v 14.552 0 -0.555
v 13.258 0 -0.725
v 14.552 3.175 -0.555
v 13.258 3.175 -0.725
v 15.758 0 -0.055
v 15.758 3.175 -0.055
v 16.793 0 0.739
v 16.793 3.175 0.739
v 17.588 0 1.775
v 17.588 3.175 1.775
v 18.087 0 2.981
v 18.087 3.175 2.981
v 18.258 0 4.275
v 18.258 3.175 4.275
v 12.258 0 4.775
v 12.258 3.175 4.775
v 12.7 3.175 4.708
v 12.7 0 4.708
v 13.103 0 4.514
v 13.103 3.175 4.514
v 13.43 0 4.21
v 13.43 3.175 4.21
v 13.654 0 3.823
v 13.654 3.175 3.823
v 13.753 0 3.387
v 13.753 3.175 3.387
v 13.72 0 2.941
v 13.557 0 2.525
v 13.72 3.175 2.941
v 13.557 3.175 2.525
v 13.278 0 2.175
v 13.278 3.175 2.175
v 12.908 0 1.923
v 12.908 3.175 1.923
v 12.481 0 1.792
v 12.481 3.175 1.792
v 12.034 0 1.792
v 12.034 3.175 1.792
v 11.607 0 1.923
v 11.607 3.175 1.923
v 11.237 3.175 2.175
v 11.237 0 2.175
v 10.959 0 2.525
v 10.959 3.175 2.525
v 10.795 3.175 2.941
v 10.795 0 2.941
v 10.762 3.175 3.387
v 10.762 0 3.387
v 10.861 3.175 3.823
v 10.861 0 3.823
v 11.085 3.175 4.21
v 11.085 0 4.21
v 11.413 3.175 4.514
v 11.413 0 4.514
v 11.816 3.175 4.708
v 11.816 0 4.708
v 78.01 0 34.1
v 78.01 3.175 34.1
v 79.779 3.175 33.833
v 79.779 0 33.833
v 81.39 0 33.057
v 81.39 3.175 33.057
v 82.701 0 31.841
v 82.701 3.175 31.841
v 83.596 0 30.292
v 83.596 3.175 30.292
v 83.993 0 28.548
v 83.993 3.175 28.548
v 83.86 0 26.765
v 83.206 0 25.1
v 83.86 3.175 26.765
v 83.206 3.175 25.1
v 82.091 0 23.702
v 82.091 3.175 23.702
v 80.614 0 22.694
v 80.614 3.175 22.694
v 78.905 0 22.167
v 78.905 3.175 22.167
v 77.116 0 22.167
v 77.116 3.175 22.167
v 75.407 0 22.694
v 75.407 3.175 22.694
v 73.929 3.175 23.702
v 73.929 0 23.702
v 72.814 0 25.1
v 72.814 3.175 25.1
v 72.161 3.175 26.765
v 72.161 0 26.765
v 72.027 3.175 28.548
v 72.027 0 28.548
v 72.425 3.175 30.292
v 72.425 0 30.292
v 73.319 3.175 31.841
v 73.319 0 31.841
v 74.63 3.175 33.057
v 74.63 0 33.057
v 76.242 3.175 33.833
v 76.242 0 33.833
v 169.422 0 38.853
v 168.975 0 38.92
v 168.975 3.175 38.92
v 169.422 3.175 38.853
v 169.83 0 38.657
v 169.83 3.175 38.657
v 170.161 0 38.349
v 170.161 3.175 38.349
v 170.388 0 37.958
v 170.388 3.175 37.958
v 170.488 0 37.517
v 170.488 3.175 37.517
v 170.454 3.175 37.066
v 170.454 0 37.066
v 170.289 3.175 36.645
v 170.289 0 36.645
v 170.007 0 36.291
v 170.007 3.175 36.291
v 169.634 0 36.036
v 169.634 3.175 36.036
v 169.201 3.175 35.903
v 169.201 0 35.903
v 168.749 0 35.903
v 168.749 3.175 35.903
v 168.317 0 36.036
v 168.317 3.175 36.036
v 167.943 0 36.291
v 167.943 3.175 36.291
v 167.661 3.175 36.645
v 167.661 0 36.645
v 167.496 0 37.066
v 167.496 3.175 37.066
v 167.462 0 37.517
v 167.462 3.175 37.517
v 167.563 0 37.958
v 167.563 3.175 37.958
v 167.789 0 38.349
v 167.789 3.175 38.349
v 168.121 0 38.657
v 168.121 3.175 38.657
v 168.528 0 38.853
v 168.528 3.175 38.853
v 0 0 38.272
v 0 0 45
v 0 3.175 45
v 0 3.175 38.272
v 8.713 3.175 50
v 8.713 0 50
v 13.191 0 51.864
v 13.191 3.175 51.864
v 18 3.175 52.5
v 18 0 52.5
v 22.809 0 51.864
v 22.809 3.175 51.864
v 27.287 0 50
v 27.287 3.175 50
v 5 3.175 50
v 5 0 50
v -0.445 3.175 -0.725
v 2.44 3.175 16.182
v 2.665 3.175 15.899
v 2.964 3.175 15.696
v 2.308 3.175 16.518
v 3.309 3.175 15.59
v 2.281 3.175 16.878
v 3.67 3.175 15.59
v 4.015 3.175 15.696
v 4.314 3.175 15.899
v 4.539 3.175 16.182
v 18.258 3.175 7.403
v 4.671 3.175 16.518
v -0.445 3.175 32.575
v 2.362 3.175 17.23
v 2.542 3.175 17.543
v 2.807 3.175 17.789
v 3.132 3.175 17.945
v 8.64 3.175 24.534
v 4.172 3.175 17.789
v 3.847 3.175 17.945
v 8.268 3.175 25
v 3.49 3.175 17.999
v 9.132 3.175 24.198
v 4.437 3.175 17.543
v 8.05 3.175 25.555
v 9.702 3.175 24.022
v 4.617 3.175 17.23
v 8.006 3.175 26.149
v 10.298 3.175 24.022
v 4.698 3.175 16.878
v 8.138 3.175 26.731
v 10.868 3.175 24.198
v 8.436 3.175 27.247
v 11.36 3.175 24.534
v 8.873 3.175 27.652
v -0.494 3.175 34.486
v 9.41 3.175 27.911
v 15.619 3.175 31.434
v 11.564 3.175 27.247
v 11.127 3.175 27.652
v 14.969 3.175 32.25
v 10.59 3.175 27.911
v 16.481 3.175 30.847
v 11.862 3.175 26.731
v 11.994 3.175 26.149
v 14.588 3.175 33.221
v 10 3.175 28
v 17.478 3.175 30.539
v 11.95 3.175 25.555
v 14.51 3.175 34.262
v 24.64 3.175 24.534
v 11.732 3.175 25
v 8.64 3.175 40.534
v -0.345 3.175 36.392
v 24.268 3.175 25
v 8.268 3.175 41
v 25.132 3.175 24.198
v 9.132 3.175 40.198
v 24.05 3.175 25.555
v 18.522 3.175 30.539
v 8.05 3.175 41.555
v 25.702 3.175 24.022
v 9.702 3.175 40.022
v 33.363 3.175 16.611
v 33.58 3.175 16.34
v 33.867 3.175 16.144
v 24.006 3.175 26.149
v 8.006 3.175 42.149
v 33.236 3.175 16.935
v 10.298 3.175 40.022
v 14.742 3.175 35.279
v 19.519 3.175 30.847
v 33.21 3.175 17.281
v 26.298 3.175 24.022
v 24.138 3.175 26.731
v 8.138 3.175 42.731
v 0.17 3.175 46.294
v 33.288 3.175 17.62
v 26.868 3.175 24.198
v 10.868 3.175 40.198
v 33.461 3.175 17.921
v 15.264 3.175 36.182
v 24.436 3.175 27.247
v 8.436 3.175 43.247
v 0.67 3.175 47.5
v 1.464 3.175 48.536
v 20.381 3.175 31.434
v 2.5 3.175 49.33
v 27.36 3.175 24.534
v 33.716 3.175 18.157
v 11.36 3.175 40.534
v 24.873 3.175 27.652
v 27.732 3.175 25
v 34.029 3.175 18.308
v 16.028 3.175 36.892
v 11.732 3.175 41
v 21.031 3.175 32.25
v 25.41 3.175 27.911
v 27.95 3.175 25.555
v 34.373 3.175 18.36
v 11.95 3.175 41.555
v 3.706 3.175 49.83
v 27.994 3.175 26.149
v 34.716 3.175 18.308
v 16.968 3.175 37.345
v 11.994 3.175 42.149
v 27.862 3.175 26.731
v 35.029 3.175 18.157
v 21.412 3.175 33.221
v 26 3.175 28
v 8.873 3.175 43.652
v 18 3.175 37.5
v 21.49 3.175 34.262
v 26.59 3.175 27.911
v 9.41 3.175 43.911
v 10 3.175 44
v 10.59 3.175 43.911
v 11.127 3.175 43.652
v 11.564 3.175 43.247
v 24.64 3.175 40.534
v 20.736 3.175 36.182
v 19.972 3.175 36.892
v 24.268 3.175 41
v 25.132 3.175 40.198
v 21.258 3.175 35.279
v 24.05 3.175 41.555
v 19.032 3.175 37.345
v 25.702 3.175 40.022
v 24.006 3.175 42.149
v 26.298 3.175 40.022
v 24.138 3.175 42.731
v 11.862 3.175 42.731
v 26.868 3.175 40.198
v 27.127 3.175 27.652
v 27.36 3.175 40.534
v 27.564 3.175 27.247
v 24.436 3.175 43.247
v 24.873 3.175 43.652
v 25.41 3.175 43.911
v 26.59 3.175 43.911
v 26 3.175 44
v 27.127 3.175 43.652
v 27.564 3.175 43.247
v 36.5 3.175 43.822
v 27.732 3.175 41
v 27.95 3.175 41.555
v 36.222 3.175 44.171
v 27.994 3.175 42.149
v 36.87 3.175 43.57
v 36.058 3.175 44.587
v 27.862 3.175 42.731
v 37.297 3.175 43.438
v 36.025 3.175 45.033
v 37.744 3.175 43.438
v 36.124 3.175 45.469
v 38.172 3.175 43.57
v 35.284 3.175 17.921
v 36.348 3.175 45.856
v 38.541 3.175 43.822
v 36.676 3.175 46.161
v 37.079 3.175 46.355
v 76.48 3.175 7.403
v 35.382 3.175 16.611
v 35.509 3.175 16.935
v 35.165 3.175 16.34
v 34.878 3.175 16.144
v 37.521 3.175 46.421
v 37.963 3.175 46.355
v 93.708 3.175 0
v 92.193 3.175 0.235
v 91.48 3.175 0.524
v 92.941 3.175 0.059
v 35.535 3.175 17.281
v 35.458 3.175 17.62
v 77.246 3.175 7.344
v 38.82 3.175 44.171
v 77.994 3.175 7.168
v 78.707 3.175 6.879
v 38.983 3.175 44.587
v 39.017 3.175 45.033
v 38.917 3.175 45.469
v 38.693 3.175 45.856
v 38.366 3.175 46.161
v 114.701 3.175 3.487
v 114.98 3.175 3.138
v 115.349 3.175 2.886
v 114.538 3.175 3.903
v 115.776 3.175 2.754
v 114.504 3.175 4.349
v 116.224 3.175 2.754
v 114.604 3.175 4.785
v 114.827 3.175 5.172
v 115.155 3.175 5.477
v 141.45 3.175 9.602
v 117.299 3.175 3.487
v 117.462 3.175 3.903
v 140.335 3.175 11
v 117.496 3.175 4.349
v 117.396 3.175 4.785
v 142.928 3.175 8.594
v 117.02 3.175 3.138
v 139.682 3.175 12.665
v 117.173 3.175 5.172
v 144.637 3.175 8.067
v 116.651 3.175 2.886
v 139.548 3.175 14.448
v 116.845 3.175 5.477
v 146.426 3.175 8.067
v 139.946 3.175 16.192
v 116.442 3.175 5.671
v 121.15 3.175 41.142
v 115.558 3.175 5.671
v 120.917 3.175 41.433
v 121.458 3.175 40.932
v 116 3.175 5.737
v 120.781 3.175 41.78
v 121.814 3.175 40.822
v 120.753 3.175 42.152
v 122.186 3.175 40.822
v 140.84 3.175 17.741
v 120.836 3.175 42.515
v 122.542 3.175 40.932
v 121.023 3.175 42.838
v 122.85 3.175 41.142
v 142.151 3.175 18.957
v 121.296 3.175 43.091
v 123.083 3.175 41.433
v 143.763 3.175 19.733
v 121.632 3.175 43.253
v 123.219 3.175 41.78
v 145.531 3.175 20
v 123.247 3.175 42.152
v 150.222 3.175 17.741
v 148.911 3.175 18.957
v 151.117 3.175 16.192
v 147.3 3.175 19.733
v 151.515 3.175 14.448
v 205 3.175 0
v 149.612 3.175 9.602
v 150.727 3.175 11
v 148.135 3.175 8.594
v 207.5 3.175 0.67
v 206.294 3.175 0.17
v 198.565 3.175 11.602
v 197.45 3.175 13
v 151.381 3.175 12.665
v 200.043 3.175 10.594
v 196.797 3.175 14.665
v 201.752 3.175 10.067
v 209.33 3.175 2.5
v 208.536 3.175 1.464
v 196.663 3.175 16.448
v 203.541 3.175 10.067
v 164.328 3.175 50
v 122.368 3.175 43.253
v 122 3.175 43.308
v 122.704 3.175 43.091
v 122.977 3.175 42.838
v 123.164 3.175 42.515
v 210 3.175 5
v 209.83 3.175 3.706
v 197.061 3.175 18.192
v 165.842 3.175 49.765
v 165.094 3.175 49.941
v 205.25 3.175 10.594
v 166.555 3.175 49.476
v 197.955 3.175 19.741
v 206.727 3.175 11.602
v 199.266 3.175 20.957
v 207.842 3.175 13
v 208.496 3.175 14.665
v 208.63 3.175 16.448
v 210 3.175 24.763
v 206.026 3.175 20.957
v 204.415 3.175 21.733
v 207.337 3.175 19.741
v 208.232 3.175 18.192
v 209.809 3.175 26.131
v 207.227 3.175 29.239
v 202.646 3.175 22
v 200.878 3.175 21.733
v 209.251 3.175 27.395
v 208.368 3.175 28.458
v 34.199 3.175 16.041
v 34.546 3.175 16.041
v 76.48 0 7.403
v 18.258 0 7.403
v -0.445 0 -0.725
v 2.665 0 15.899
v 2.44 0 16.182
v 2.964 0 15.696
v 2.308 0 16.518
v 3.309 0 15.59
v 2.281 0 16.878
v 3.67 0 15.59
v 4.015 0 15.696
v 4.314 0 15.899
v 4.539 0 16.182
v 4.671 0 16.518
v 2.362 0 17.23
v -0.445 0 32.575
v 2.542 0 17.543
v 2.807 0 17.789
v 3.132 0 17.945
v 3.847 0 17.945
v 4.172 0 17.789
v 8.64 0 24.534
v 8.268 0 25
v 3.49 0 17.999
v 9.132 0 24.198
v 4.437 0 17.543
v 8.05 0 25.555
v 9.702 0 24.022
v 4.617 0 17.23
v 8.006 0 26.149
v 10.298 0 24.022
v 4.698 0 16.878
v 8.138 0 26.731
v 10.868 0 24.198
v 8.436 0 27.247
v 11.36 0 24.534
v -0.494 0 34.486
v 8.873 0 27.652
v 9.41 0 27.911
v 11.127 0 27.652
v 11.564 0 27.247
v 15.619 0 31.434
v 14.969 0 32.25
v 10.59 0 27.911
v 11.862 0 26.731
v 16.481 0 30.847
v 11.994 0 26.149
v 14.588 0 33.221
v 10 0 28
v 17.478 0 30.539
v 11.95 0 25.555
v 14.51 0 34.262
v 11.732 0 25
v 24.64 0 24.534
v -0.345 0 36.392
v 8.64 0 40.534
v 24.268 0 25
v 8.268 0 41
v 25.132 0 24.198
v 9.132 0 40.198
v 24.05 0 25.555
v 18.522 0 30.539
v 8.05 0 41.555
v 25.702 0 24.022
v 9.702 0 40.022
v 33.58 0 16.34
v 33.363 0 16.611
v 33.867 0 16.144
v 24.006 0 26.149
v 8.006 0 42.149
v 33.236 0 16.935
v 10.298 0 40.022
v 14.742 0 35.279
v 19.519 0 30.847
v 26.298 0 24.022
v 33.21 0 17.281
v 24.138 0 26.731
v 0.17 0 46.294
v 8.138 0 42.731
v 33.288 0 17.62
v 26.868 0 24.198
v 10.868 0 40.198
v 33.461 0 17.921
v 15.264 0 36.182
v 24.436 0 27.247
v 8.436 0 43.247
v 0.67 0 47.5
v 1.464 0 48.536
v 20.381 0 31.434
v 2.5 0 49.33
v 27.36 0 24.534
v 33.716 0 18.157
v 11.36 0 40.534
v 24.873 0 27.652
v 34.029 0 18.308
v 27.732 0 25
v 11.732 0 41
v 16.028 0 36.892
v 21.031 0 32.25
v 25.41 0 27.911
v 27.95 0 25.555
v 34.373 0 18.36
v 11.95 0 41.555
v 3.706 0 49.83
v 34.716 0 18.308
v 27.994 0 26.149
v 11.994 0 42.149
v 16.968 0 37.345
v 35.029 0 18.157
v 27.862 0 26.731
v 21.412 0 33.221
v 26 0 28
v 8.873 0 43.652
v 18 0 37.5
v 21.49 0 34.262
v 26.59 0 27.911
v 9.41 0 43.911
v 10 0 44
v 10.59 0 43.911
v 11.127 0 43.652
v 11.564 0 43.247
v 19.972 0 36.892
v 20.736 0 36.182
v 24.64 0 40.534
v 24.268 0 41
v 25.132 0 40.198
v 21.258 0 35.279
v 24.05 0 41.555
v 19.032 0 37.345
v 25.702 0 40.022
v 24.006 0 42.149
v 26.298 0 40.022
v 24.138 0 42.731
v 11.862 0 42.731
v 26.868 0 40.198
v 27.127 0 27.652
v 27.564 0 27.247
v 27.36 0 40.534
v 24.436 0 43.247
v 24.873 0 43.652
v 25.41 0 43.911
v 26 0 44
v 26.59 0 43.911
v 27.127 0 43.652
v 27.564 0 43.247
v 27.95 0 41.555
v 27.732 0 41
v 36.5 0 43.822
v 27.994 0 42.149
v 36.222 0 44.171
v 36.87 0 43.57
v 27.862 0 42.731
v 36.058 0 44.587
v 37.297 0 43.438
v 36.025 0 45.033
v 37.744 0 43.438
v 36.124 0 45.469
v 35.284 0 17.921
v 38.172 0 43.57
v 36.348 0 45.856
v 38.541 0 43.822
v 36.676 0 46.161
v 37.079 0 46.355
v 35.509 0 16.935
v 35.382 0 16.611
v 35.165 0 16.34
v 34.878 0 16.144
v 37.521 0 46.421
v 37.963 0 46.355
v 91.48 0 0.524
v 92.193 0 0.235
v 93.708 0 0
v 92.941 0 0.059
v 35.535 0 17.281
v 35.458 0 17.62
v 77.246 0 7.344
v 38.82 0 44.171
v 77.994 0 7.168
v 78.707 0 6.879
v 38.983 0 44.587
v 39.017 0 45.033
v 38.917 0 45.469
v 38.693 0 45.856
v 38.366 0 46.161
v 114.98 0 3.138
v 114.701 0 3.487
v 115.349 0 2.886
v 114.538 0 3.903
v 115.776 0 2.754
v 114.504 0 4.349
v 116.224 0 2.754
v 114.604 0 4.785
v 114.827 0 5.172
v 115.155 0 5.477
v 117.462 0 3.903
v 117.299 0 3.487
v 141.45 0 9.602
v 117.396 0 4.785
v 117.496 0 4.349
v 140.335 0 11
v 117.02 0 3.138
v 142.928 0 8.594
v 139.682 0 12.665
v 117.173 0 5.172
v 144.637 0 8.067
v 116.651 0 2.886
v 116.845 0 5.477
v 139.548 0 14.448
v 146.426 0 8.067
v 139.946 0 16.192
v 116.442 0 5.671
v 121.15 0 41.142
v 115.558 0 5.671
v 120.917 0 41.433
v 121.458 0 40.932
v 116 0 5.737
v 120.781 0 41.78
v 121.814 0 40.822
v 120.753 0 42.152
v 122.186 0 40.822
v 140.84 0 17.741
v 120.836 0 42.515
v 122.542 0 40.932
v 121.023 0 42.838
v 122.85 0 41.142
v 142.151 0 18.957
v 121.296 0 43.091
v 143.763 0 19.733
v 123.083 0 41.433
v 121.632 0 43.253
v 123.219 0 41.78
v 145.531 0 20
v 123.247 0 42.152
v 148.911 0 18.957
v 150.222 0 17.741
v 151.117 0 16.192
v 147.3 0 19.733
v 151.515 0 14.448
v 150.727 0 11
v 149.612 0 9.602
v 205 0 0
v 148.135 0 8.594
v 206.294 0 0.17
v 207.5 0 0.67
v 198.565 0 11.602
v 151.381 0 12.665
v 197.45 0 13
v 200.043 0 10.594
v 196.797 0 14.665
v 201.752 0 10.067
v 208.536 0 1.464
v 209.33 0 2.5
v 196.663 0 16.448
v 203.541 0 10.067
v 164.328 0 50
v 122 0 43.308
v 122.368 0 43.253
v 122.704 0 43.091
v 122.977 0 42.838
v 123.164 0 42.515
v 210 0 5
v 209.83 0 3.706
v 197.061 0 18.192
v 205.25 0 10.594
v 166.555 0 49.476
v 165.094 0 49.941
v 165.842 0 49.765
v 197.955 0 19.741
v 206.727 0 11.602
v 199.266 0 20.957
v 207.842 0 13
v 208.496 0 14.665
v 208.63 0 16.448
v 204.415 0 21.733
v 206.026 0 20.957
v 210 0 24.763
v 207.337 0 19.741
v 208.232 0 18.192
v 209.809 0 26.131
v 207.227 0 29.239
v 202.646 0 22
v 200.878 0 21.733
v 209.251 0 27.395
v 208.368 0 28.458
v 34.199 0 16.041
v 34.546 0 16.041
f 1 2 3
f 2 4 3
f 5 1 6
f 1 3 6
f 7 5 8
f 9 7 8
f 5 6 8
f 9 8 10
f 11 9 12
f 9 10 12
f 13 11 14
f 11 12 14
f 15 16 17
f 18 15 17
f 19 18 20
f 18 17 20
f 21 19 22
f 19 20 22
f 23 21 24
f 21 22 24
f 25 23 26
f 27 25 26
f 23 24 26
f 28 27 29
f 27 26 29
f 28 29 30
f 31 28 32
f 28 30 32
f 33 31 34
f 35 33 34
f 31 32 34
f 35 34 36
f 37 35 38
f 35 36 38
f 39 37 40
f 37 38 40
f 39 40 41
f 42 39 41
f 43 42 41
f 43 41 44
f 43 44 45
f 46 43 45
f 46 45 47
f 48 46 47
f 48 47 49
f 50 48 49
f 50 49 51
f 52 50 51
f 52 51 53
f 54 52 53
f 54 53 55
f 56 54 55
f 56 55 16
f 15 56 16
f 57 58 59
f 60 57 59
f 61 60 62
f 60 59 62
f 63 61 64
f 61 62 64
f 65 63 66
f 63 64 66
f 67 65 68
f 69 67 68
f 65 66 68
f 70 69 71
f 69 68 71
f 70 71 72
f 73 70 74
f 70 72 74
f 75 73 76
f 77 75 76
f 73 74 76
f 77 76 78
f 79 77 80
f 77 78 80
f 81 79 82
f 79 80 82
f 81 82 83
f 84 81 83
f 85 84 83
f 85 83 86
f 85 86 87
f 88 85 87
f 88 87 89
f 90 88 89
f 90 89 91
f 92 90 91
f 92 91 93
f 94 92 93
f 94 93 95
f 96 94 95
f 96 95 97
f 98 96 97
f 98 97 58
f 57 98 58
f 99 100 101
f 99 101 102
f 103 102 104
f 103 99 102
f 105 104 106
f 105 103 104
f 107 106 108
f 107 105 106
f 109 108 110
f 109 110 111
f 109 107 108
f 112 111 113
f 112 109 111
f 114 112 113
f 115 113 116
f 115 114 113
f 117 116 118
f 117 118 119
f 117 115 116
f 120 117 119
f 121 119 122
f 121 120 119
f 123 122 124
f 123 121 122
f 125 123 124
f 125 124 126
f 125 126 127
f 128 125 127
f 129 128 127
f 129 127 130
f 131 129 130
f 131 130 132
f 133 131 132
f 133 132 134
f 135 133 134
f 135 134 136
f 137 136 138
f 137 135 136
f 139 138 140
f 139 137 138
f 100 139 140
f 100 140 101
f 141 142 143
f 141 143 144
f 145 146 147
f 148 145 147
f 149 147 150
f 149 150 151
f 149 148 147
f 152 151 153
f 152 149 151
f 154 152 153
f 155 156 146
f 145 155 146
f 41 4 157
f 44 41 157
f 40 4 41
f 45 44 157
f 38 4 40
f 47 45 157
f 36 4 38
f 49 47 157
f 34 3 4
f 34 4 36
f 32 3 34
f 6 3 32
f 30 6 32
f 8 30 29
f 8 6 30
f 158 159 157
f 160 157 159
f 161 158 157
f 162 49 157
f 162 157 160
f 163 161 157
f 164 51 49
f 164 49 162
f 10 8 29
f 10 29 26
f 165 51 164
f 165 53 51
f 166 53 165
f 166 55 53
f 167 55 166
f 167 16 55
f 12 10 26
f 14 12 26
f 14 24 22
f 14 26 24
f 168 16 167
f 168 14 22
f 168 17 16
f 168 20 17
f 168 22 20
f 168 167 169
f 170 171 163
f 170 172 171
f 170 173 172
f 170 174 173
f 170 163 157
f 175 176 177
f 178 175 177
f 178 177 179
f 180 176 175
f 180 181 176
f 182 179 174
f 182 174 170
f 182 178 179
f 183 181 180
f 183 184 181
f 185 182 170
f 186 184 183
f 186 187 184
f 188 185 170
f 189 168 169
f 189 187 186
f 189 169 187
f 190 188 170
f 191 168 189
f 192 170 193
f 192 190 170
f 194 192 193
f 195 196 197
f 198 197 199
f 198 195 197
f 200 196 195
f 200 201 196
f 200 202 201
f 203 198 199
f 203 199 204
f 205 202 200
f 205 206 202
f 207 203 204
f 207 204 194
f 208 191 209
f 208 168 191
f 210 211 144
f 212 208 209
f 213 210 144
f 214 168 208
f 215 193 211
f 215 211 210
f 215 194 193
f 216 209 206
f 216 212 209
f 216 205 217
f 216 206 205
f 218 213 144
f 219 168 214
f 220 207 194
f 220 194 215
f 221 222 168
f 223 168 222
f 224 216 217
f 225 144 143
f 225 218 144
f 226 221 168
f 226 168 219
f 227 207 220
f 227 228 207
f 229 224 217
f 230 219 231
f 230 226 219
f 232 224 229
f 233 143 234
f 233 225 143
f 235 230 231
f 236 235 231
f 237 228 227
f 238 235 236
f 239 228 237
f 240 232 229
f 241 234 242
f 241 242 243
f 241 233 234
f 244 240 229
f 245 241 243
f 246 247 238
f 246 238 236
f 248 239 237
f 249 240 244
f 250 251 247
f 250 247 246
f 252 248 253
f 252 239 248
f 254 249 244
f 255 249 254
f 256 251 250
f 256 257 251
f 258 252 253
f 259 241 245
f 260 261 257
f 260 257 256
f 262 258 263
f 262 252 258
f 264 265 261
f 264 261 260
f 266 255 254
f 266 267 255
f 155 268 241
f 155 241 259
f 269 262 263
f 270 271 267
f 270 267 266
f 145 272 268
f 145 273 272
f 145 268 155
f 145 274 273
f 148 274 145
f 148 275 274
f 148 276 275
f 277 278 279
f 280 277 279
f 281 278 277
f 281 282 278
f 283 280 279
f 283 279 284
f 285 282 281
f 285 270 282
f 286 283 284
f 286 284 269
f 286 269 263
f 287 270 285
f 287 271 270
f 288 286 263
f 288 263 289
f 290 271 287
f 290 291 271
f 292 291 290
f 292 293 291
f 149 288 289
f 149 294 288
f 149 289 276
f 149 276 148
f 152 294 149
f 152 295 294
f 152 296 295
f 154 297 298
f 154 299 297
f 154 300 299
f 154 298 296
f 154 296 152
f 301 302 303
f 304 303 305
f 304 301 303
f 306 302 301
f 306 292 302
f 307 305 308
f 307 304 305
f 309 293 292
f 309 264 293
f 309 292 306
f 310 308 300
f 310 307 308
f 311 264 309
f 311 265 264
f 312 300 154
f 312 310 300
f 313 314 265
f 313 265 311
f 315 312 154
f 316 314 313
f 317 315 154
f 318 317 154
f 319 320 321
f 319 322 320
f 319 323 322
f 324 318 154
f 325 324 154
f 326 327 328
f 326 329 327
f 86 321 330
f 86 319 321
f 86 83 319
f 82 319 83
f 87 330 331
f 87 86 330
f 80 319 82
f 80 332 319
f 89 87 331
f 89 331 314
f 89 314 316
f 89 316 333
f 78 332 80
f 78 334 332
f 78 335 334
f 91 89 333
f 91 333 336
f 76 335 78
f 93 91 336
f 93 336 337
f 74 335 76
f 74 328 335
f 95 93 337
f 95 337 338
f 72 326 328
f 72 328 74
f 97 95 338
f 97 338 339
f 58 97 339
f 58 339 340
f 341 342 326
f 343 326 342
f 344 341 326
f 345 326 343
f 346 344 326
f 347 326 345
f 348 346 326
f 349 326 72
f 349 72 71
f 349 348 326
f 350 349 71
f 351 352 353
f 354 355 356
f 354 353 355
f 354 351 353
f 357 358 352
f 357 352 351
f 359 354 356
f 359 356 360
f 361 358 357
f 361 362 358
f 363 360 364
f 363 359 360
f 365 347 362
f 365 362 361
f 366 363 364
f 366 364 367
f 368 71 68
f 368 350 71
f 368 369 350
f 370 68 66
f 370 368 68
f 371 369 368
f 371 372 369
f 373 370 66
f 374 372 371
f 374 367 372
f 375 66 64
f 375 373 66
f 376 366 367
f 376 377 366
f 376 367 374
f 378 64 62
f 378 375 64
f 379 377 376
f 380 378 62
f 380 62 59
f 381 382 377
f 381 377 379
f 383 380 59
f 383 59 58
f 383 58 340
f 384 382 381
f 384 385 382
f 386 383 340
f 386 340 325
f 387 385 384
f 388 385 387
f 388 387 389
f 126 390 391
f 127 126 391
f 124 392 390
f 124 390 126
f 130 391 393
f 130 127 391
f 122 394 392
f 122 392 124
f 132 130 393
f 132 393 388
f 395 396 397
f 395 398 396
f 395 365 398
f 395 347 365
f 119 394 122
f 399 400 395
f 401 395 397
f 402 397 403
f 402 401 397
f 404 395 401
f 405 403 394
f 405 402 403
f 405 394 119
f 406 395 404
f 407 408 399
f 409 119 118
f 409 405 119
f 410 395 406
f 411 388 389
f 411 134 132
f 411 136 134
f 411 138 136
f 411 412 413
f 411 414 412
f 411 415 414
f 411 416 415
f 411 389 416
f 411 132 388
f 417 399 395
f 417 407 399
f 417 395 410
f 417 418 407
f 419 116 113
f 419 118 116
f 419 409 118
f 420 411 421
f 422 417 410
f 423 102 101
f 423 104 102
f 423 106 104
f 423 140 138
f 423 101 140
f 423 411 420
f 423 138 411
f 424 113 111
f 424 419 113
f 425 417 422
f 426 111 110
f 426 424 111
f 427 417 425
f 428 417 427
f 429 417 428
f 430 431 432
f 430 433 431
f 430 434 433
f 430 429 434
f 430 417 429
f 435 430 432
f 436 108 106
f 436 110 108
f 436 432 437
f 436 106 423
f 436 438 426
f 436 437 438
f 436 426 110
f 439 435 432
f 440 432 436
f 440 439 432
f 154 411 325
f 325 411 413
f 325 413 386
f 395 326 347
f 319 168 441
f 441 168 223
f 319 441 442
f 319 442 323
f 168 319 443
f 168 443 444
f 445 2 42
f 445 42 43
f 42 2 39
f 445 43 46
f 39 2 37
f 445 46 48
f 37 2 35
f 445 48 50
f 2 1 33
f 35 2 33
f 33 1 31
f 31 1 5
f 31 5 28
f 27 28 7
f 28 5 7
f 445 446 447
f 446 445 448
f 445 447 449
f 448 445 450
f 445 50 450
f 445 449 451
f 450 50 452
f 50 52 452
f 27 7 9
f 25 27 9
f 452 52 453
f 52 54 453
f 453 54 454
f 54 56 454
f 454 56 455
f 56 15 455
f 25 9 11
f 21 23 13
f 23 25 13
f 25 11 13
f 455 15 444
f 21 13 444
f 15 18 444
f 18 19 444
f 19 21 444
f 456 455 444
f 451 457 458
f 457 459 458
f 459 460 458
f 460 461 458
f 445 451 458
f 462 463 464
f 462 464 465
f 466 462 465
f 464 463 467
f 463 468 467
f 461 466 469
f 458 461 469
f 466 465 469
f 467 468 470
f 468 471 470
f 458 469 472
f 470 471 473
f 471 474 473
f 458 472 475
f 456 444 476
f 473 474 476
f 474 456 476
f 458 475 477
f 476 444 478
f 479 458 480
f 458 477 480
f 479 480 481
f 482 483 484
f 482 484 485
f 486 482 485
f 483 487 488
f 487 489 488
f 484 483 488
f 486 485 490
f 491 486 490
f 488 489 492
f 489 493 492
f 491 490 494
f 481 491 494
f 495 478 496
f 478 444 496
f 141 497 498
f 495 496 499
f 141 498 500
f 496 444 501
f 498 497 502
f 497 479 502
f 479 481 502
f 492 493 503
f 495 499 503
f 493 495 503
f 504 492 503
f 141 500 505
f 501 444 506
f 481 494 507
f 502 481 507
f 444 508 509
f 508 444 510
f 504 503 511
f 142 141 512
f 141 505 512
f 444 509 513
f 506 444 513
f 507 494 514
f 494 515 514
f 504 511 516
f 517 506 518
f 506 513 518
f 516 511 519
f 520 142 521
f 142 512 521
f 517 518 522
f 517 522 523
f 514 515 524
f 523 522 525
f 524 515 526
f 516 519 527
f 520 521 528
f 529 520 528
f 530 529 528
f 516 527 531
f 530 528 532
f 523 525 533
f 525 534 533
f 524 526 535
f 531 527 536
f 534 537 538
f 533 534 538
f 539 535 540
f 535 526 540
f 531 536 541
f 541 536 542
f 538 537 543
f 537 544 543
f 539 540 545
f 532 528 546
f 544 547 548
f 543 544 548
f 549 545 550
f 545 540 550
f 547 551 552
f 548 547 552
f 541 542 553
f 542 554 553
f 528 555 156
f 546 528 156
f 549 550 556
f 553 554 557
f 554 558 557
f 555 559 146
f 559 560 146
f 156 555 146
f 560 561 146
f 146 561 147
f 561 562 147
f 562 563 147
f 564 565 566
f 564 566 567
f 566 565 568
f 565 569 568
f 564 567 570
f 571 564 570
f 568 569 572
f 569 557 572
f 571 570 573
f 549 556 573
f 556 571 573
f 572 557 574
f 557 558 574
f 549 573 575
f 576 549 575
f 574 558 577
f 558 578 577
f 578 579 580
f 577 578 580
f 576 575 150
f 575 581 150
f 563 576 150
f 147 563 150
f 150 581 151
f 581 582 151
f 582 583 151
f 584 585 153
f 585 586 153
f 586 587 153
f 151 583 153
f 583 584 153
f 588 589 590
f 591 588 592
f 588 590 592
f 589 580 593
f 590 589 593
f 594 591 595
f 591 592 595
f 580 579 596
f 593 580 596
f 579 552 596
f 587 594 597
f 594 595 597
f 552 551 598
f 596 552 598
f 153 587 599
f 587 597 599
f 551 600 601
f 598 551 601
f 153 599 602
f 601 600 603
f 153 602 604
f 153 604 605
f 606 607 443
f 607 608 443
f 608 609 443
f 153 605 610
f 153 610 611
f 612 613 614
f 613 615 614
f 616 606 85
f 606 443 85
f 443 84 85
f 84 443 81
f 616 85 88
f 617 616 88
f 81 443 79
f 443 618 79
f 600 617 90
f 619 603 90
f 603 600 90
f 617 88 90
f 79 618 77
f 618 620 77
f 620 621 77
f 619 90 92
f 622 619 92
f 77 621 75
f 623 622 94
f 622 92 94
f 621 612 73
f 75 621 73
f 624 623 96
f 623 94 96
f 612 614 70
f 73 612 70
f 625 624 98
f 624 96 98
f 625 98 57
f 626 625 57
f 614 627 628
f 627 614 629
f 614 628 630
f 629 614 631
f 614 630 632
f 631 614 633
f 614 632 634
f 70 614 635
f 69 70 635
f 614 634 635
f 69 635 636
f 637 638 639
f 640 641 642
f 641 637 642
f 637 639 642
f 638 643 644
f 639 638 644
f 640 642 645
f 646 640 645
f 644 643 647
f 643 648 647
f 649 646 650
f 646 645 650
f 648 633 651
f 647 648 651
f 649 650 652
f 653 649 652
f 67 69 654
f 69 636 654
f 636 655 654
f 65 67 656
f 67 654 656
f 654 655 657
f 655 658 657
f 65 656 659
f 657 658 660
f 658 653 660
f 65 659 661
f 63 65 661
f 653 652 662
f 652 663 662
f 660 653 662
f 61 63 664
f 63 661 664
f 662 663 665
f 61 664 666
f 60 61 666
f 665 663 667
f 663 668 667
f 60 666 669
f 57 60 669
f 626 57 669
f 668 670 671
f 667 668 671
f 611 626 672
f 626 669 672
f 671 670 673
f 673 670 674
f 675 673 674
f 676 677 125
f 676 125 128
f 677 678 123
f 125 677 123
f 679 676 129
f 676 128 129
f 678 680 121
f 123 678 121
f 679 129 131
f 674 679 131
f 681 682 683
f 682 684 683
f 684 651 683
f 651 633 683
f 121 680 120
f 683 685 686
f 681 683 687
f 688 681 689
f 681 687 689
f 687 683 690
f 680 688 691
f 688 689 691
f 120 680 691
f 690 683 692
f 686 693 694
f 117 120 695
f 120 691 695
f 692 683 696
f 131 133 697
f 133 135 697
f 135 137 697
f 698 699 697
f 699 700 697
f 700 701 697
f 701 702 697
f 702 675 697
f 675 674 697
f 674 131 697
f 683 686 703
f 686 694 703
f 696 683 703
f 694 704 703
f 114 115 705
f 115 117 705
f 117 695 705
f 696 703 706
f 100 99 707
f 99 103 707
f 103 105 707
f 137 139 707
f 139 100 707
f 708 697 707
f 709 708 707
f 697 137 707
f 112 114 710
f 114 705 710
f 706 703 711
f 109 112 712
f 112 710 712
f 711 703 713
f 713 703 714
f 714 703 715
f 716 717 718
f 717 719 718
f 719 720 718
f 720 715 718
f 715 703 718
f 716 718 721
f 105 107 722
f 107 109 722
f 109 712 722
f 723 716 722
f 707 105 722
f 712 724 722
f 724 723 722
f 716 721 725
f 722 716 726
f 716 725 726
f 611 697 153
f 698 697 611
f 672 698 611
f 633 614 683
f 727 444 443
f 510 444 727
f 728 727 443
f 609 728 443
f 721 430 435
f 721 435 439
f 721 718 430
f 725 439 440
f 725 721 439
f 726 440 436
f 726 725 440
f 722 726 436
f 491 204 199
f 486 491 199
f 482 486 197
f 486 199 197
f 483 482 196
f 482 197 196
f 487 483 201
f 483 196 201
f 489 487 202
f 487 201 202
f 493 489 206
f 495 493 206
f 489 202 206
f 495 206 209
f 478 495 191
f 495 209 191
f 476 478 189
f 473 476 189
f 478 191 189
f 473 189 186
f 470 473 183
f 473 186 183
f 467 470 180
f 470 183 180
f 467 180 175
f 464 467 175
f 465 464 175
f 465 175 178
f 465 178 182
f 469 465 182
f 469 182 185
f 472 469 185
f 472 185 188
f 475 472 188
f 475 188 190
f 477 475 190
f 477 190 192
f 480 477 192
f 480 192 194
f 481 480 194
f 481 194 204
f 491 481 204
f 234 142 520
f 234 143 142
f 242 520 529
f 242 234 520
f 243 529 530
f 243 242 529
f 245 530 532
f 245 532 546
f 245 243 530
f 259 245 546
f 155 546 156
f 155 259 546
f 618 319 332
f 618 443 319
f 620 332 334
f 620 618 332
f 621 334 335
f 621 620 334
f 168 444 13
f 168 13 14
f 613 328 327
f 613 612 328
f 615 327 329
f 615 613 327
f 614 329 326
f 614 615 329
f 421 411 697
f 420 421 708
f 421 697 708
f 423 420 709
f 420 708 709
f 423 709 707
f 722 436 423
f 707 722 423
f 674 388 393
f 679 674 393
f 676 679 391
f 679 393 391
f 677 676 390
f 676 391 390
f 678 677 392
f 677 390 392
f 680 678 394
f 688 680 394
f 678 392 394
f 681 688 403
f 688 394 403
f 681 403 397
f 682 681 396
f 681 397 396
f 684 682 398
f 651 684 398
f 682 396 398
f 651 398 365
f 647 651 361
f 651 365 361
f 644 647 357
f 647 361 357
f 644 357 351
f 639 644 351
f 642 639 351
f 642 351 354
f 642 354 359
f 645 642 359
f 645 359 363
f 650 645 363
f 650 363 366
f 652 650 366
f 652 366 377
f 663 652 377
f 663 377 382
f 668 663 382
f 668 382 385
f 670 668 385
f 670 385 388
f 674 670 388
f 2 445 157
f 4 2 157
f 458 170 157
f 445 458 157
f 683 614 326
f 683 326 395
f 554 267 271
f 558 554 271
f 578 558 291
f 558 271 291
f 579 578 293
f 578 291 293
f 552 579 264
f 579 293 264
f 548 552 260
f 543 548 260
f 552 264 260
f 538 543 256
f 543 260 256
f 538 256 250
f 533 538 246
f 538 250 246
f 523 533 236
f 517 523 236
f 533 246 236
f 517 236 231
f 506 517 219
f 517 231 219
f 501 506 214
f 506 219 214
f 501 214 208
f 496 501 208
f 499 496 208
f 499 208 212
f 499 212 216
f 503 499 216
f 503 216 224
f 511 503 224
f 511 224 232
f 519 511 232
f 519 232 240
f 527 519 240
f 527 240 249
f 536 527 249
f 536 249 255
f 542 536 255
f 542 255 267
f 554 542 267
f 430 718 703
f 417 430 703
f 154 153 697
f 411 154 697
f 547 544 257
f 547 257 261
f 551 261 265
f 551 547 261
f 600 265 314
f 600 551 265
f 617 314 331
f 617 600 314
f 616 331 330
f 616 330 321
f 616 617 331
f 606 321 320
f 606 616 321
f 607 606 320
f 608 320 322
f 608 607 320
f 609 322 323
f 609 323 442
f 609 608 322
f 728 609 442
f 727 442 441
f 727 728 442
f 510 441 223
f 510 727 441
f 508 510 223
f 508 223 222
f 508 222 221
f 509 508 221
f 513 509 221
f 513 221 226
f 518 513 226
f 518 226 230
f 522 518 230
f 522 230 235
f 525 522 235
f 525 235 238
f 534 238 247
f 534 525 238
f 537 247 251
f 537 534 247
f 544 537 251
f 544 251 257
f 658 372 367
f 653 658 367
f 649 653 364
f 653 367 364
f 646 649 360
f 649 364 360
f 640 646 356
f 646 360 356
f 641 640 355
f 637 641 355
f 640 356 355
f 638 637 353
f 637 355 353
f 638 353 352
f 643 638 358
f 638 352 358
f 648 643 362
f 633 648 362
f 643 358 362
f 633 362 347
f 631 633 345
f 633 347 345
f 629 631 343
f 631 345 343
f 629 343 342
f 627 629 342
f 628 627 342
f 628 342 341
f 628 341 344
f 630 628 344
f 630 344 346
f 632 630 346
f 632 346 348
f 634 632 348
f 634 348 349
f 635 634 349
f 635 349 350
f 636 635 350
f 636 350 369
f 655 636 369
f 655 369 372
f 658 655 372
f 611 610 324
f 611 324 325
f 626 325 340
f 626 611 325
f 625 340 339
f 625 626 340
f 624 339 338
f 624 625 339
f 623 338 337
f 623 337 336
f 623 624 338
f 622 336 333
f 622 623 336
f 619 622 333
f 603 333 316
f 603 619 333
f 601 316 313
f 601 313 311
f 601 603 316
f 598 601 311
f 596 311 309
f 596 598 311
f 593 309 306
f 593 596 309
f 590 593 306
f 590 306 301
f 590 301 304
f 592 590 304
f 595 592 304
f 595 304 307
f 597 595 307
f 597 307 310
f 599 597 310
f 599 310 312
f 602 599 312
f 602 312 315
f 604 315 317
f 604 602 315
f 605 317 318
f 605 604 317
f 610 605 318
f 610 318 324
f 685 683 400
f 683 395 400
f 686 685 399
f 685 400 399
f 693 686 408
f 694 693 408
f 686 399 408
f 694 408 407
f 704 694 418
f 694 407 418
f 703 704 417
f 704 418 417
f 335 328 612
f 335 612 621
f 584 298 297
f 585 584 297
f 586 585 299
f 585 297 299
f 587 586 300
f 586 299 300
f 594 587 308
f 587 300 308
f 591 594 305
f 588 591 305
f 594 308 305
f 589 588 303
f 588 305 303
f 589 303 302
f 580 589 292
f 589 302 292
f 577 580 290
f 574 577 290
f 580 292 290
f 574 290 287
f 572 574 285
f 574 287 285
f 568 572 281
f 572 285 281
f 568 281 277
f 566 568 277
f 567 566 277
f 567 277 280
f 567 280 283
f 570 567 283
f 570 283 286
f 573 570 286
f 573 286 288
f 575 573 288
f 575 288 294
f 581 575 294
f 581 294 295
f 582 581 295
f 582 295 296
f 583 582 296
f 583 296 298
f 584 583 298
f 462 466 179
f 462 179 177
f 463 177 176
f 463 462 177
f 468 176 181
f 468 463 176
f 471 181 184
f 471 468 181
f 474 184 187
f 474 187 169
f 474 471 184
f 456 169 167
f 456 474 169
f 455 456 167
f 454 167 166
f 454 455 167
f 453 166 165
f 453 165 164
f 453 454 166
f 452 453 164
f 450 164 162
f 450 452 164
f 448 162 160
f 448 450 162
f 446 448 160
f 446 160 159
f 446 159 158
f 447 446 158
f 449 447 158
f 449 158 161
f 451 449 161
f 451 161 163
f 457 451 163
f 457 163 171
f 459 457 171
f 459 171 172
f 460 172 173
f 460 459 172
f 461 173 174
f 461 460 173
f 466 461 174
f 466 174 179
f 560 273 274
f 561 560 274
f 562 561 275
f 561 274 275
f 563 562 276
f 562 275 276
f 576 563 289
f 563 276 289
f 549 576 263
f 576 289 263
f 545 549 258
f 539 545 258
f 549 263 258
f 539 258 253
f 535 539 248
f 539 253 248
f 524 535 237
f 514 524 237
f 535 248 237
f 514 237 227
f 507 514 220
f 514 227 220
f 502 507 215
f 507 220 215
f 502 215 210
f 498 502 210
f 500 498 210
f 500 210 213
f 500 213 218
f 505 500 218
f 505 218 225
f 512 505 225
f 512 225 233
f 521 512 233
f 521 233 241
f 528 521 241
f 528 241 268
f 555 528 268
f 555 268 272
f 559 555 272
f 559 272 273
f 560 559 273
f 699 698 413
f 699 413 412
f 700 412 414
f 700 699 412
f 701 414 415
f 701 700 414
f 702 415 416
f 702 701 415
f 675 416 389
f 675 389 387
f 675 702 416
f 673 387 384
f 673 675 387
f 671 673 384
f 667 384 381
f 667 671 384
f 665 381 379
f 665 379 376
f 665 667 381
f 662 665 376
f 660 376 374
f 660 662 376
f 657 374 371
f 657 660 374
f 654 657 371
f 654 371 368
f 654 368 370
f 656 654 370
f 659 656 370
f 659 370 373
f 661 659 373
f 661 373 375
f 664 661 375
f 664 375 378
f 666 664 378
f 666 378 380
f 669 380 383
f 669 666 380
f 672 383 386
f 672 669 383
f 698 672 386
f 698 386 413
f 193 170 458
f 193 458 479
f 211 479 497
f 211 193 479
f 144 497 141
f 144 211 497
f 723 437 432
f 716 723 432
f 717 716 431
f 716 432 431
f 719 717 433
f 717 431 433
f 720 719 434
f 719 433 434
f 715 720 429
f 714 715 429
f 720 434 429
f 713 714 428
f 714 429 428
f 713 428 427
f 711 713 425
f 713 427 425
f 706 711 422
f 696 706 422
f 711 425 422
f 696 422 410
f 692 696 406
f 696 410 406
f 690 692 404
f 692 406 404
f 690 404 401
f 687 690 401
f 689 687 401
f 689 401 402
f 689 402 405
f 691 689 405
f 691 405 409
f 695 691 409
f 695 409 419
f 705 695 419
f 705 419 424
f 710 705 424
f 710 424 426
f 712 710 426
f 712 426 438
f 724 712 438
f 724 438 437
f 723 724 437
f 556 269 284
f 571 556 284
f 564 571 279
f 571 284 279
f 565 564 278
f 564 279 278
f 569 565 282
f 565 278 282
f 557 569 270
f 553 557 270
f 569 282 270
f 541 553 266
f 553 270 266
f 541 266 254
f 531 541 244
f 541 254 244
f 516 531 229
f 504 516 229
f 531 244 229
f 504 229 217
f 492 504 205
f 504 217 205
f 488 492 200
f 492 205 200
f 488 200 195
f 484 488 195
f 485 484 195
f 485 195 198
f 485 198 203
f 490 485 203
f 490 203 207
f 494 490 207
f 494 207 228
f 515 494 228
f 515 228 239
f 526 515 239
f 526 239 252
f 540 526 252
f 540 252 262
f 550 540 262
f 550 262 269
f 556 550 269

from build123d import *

# Parameters (mm, degrees)
SKETCH1_W           = 210
SKETCH1_H           = 50
SKETCH1_R           = 1.211665018
SKETCH1_R_2         = 1.165617118
SKETCH1_R_3         = 1.5
SKETCH1_R_4         = 1.25
SKETCH1_R_5         = 1.517273905
SKETCH1_R_6         = 3.4
BOSS_EXTRUDE1_DEPTH = 3.175
SKETCH2_R           = 2
CUT_EXTRUDE1_DEPTH  = 10
SKETCH3_R           = 6
SKETCH3_R_2         = 0.586995366
CUT_EXTRUDE2_DEPTH  = 57.15
CUT_EXTRUDE7_DEPTH  = 10
FILLET3_R           = 5
SKETCH11_R          = 18.5
SKETCH11_R_2        = 2
BOSS_EXTRUDE4_DEPTH = 3.175
SKETCH16_W          = 18.257640281
SKETCH16_H          = 3.175
BOSS_EXTRUDE7_DEPTH = 8.128
SKETCH17_W          = 33.3
SKETCH17_H          = 3.175
BOSS_EXTRUDE8_DEPTH = 35.56
SKETCH18_R          = 2
CUT_EXTRUDE8_DEPTH  = 9
SKETCH19_R          = 4
CUT_EXTRUDE9_DEPTH  = 40
FILLET4_R           = 5
SKETCH20_R          = 3.5
CUT_EXTRUDE10_DEPTH = 10
SKETCH21_R          = 1.5
CUT_EXTRUDE11_DEPTH = 10
SKETCH22_R          = 1.5
CUT_EXTRUDE12_DEPTH = 10
SKETCH24_R          = 1.5
CUT_EXTRUDE13_DEPTH = 10
SKETCH25_W          = 49.782255358
SKETCH25_H          = 46.410966041
CUT_EXTRUDE14_DEPTH = 10


with BuildPart() as part:
    # Sketch1 → Boss-Extrude1 (new body)
    with BuildSketch(Plane(origin=(0, 0, 0), x_dir=(1, 0, 0), z_dir=(0, 1, 0))):
        with Locations((105, -25)):
            Rectangle(SKETCH1_W, SKETCH1_H)
        with Locations(Location((3.489526233, -16.787661112, 0), (0, 0, 270))):
            Circle(SKETCH1_R, mode=Mode.SUBTRACT)
        with Locations(Location((34.37258772, -17.194005245, 0), (0, 0, 270))):
            Circle(SKETCH1_R_2, mode=Mode.SUBTRACT)
        with Locations(Location((37.520749958, -44.921198121, 0), (0, 0, 270))):
            Circle(SKETCH1_R_3, mode=Mode.SUBTRACT)
        with Locations(Location((122, -42.058139805, 0), (0, 0, 270))):
            Circle(SKETCH1_R_4, mode=Mode.SUBTRACT)
        with Locations(Location((168.975233936, -37.403209633, 0), (0, 0, 270))):
            Circle(SKETCH1_R_5, mode=Mode.SUBTRACT)
        with Locations(Location((18, -34, 0), (0, 0, 270))):
            Circle(SKETCH1_R_6, mode=Mode.SUBTRACT)
    extrude(amount=BOSS_EXTRUDE1_DEPTH)

    # Sketch2 → Cut-Extrude1 (cut)
    with BuildSketch(Plane(origin=(0, 3.175, 0), x_dir=(1, 0, 0), z_dir=(0, 1, 0))):
        with Locations(Location((10, -26, 0), (0, 0, 270))):
            Circle(SKETCH2_R)
        with Locations(Location((10, -42, 0), (0, 0, 270))):
            Circle(SKETCH2_R)
        with Locations(Location((26, -26, 0), (0, 0, 270))):
            Circle(SKETCH2_R)
        with Locations(Location((26, -42, 0), (0, 0, 270))):
            Circle(SKETCH2_R)
    extrude(amount=-CUT_EXTRUDE1_DEPTH, mode=Mode.SUBTRACT)

    # Sketch3 → Cut-Extrude2 (cut)
    with BuildSketch(Plane(origin=(0, 3.175, 0), x_dir=(1, 0, 0), z_dir=(0, 1, 0))):
        with Locations(Location((78.01026379, -28.1, 0), (0, 0, 270))):
            Circle(SKETCH3_R)
        with Locations(Location((145.531297368, -14, 0), (0, 0, 270))):
            Circle(SKETCH3_R)
        with Locations((18, -34)):
            Circle(SKETCH3_R_2)
        with Locations(Location((202.646291021, -16, 0), (0, 0, 270))):
            Circle(SKETCH3_R)
    extrude(amount=-CUT_EXTRUDE2_DEPTH, mode=Mode.SUBTRACT)

    # Sketch10 → Cut-Extrude7 (cut)
    with BuildSketch(Plane(origin=(0, 3.175, 0), x_dir=(1, 0, 0), z_dir=(0, 1, 0))):
        Polygon((210, -27.859435908), (165.502877994, -50), (210, -50), align=None)
        Polygon((92.532613397, 0), (77.65477062, -7.402812063), (0, -7.402812063), (0, 0), align=None)
    extrude(amount=-CUT_EXTRUDE7_DEPTH, mode=Mode.SUBTRACT)

    # Fillet3
    fillet3_edges = [part.edges().sort_by_distance(p)[0] for p in [
        (210, 1.5875, 0),
        (92.532613397, 1.5875, 0),
        (210, 1.5875, 27.859435908),
        (165.502877994, 1.5875, 50),
        (77.65477062, 1.5875, 7.402812063),
    ]]
    fillet(fillet3_edges, radius=FILLET3_R)

    # Sketch11 → Boss-Extrude4 (add)
    with BuildSketch(Plane(origin=(0, 3.175, 0), x_dir=(1, 0, 0), z_dir=(0, 1, 0))):
        with Locations((18, -34)):
            Circle(SKETCH11_R)
        with Locations(Location((10, -26, 0), (0, 0, 270))):
            Circle(SKETCH11_R_2, mode=Mode.SUBTRACT)
        with Locations(Location((10, -42, 0), (0, 0, 270))):
            Circle(SKETCH11_R_2, mode=Mode.SUBTRACT)
        with Locations(Location((26, -26, 0), (0, 0, 270))):
            Circle(SKETCH11_R_2, mode=Mode.SUBTRACT)
        with Locations(Location((26, -42, 0), (0, 0, 270))):
            Circle(SKETCH11_R_2, mode=Mode.SUBTRACT)
    extrude(amount=-BOSS_EXTRUDE4_DEPTH)

    # Sketch16 → Boss-Extrude7 (add)
    with BuildSketch(Plane(origin=(0, 0, 7.402812063), x_dir=(-1, 0, 0), z_dir=(0, 0, -1))):
        with Locations((-9.128820141, 1.5875)):
            Rectangle(SKETCH16_W, SKETCH16_H)
    extrude(amount=BOSS_EXTRUDE7_DEPTH)

    # Sketch17 → Boss-Extrude8 (add)
    with BuildSketch(Plane.ZY):
        with Locations((15.924812063, 1.5875)):
            Rectangle(SKETCH17_W, SKETCH17_H)
    extrude(amount=BOSS_EXTRUDE8_DEPTH)

    # Sketch18 → Cut-Extrude8 (cut)
    with BuildSketch(Plane(origin=(0, 3.175, 0), x_dir=(1, 0, 0), z_dir=(0, 1, 0))):
        with Locations(Location((-29.612034681, -23.798543698, 0), (0, 0, 270))):
            Circle(SKETCH18_R)
        with Locations(Location((-29.359661767, -7.798707515, 0), (0, 0, 270))):
            Circle(SKETCH18_R)
        with Locations(Location((-13.359825583, -8.051080428, 0), (0, 0, 270))):
            Circle(SKETCH18_R)
        with Locations(Location((-13.612198497, -24.050916612, 0), (0, 0, 270))):
            Circle(SKETCH18_R)
    extrude(amount=-CUT_EXTRUDE8_DEPTH, mode=Mode.SUBTRACT)

    # Sketch19 → Cut-Extrude9 (cut)
    with BuildSketch(Plane(origin=(0, 3.175, 0), x_dir=(1, 0, 0), z_dir=(0, 1, 0))):
        with Locations(Location((-21.359661767, -15.798707515, 0), (0, 0, 270))):
            Circle(SKETCH19_R)
    extrude(amount=-CUT_EXTRUDE9_DEPTH, mode=Mode.SUBTRACT)

    # Fillet4
    fillet4_edges = [part.edges().sort_by_distance(p)[0] for p in [
        (18.257640281, 1.5875, -0.725187937),
        (-35.56, 1.5875, -0.725187937),
        (-35.56, 1.5875, 32.574812063),
        (0, 1.5875, 50),
    ]]
    fillet(fillet4_edges, radius=FILLET4_R)

    # Sketch20 → Cut-Extrude10 (cut)
    with BuildSketch(Plane(origin=(0, 3.175, 0), x_dir=(1, 0, 0), z_dir=(0, 1, 0))):
        with Locations(Location((18, -34, 0), (0, 0, 270))):
            Circle(SKETCH20_R)
    extrude(amount=-CUT_EXTRUDE10_DEPTH, mode=Mode.SUBTRACT)

    # Sketch21 → Cut-Extrude11 (cut)
    with BuildSketch(Plane(origin=(0, 3.175, 0), x_dir=(1, 0, 0), z_dir=(0, 1, 0))):
        with Locations(Location((116, -4.237214774, 0), (0, 0, 270))):
            Circle(SKETCH21_R)
    extrude(amount=-CUT_EXTRUDE11_DEPTH, mode=Mode.SUBTRACT)

    # Sketch22 → Cut-Extrude12 (cut)
    with BuildSketch(Plane(origin=(0, 3.175, 0), x_dir=(1, 0, 0), z_dir=(0, 1, 0))):
        with Locations(Location((12.257640281, -3.274812063, 0), (0, 0, 270))):
            Circle(SKETCH22_R)
    extrude(amount=-CUT_EXTRUDE12_DEPTH, mode=Mode.SUBTRACT)

    # Sketch24 → Cut-Extrude13 (cut)
    with BuildSketch(Plane(origin=(0, 3.175, 0), x_dir=(1, 0, 0), z_dir=(0, 1, 0))):
        with Locations(Location((-30.56, -15.774812063, 0), (0, 0, 270))):
            Circle(SKETCH24_R)
    extrude(amount=-CUT_EXTRUDE13_DEPTH, mode=Mode.SUBTRACT)

    # Sketch25 → Cut-Extrude14 (cut)
    with BuildSketch(Plane(origin=(0, 3.175, 0), x_dir=(1, 0, 0), z_dir=(0, 1, 0))):
        with Locations((-25.336149754, -9.369329043)):
            Rectangle(SKETCH25_W, SKETCH25_H)
    extrude(amount=-CUT_EXTRUDE14_DEPTH, mode=Mode.SUBTRACT)


solid = part.part
